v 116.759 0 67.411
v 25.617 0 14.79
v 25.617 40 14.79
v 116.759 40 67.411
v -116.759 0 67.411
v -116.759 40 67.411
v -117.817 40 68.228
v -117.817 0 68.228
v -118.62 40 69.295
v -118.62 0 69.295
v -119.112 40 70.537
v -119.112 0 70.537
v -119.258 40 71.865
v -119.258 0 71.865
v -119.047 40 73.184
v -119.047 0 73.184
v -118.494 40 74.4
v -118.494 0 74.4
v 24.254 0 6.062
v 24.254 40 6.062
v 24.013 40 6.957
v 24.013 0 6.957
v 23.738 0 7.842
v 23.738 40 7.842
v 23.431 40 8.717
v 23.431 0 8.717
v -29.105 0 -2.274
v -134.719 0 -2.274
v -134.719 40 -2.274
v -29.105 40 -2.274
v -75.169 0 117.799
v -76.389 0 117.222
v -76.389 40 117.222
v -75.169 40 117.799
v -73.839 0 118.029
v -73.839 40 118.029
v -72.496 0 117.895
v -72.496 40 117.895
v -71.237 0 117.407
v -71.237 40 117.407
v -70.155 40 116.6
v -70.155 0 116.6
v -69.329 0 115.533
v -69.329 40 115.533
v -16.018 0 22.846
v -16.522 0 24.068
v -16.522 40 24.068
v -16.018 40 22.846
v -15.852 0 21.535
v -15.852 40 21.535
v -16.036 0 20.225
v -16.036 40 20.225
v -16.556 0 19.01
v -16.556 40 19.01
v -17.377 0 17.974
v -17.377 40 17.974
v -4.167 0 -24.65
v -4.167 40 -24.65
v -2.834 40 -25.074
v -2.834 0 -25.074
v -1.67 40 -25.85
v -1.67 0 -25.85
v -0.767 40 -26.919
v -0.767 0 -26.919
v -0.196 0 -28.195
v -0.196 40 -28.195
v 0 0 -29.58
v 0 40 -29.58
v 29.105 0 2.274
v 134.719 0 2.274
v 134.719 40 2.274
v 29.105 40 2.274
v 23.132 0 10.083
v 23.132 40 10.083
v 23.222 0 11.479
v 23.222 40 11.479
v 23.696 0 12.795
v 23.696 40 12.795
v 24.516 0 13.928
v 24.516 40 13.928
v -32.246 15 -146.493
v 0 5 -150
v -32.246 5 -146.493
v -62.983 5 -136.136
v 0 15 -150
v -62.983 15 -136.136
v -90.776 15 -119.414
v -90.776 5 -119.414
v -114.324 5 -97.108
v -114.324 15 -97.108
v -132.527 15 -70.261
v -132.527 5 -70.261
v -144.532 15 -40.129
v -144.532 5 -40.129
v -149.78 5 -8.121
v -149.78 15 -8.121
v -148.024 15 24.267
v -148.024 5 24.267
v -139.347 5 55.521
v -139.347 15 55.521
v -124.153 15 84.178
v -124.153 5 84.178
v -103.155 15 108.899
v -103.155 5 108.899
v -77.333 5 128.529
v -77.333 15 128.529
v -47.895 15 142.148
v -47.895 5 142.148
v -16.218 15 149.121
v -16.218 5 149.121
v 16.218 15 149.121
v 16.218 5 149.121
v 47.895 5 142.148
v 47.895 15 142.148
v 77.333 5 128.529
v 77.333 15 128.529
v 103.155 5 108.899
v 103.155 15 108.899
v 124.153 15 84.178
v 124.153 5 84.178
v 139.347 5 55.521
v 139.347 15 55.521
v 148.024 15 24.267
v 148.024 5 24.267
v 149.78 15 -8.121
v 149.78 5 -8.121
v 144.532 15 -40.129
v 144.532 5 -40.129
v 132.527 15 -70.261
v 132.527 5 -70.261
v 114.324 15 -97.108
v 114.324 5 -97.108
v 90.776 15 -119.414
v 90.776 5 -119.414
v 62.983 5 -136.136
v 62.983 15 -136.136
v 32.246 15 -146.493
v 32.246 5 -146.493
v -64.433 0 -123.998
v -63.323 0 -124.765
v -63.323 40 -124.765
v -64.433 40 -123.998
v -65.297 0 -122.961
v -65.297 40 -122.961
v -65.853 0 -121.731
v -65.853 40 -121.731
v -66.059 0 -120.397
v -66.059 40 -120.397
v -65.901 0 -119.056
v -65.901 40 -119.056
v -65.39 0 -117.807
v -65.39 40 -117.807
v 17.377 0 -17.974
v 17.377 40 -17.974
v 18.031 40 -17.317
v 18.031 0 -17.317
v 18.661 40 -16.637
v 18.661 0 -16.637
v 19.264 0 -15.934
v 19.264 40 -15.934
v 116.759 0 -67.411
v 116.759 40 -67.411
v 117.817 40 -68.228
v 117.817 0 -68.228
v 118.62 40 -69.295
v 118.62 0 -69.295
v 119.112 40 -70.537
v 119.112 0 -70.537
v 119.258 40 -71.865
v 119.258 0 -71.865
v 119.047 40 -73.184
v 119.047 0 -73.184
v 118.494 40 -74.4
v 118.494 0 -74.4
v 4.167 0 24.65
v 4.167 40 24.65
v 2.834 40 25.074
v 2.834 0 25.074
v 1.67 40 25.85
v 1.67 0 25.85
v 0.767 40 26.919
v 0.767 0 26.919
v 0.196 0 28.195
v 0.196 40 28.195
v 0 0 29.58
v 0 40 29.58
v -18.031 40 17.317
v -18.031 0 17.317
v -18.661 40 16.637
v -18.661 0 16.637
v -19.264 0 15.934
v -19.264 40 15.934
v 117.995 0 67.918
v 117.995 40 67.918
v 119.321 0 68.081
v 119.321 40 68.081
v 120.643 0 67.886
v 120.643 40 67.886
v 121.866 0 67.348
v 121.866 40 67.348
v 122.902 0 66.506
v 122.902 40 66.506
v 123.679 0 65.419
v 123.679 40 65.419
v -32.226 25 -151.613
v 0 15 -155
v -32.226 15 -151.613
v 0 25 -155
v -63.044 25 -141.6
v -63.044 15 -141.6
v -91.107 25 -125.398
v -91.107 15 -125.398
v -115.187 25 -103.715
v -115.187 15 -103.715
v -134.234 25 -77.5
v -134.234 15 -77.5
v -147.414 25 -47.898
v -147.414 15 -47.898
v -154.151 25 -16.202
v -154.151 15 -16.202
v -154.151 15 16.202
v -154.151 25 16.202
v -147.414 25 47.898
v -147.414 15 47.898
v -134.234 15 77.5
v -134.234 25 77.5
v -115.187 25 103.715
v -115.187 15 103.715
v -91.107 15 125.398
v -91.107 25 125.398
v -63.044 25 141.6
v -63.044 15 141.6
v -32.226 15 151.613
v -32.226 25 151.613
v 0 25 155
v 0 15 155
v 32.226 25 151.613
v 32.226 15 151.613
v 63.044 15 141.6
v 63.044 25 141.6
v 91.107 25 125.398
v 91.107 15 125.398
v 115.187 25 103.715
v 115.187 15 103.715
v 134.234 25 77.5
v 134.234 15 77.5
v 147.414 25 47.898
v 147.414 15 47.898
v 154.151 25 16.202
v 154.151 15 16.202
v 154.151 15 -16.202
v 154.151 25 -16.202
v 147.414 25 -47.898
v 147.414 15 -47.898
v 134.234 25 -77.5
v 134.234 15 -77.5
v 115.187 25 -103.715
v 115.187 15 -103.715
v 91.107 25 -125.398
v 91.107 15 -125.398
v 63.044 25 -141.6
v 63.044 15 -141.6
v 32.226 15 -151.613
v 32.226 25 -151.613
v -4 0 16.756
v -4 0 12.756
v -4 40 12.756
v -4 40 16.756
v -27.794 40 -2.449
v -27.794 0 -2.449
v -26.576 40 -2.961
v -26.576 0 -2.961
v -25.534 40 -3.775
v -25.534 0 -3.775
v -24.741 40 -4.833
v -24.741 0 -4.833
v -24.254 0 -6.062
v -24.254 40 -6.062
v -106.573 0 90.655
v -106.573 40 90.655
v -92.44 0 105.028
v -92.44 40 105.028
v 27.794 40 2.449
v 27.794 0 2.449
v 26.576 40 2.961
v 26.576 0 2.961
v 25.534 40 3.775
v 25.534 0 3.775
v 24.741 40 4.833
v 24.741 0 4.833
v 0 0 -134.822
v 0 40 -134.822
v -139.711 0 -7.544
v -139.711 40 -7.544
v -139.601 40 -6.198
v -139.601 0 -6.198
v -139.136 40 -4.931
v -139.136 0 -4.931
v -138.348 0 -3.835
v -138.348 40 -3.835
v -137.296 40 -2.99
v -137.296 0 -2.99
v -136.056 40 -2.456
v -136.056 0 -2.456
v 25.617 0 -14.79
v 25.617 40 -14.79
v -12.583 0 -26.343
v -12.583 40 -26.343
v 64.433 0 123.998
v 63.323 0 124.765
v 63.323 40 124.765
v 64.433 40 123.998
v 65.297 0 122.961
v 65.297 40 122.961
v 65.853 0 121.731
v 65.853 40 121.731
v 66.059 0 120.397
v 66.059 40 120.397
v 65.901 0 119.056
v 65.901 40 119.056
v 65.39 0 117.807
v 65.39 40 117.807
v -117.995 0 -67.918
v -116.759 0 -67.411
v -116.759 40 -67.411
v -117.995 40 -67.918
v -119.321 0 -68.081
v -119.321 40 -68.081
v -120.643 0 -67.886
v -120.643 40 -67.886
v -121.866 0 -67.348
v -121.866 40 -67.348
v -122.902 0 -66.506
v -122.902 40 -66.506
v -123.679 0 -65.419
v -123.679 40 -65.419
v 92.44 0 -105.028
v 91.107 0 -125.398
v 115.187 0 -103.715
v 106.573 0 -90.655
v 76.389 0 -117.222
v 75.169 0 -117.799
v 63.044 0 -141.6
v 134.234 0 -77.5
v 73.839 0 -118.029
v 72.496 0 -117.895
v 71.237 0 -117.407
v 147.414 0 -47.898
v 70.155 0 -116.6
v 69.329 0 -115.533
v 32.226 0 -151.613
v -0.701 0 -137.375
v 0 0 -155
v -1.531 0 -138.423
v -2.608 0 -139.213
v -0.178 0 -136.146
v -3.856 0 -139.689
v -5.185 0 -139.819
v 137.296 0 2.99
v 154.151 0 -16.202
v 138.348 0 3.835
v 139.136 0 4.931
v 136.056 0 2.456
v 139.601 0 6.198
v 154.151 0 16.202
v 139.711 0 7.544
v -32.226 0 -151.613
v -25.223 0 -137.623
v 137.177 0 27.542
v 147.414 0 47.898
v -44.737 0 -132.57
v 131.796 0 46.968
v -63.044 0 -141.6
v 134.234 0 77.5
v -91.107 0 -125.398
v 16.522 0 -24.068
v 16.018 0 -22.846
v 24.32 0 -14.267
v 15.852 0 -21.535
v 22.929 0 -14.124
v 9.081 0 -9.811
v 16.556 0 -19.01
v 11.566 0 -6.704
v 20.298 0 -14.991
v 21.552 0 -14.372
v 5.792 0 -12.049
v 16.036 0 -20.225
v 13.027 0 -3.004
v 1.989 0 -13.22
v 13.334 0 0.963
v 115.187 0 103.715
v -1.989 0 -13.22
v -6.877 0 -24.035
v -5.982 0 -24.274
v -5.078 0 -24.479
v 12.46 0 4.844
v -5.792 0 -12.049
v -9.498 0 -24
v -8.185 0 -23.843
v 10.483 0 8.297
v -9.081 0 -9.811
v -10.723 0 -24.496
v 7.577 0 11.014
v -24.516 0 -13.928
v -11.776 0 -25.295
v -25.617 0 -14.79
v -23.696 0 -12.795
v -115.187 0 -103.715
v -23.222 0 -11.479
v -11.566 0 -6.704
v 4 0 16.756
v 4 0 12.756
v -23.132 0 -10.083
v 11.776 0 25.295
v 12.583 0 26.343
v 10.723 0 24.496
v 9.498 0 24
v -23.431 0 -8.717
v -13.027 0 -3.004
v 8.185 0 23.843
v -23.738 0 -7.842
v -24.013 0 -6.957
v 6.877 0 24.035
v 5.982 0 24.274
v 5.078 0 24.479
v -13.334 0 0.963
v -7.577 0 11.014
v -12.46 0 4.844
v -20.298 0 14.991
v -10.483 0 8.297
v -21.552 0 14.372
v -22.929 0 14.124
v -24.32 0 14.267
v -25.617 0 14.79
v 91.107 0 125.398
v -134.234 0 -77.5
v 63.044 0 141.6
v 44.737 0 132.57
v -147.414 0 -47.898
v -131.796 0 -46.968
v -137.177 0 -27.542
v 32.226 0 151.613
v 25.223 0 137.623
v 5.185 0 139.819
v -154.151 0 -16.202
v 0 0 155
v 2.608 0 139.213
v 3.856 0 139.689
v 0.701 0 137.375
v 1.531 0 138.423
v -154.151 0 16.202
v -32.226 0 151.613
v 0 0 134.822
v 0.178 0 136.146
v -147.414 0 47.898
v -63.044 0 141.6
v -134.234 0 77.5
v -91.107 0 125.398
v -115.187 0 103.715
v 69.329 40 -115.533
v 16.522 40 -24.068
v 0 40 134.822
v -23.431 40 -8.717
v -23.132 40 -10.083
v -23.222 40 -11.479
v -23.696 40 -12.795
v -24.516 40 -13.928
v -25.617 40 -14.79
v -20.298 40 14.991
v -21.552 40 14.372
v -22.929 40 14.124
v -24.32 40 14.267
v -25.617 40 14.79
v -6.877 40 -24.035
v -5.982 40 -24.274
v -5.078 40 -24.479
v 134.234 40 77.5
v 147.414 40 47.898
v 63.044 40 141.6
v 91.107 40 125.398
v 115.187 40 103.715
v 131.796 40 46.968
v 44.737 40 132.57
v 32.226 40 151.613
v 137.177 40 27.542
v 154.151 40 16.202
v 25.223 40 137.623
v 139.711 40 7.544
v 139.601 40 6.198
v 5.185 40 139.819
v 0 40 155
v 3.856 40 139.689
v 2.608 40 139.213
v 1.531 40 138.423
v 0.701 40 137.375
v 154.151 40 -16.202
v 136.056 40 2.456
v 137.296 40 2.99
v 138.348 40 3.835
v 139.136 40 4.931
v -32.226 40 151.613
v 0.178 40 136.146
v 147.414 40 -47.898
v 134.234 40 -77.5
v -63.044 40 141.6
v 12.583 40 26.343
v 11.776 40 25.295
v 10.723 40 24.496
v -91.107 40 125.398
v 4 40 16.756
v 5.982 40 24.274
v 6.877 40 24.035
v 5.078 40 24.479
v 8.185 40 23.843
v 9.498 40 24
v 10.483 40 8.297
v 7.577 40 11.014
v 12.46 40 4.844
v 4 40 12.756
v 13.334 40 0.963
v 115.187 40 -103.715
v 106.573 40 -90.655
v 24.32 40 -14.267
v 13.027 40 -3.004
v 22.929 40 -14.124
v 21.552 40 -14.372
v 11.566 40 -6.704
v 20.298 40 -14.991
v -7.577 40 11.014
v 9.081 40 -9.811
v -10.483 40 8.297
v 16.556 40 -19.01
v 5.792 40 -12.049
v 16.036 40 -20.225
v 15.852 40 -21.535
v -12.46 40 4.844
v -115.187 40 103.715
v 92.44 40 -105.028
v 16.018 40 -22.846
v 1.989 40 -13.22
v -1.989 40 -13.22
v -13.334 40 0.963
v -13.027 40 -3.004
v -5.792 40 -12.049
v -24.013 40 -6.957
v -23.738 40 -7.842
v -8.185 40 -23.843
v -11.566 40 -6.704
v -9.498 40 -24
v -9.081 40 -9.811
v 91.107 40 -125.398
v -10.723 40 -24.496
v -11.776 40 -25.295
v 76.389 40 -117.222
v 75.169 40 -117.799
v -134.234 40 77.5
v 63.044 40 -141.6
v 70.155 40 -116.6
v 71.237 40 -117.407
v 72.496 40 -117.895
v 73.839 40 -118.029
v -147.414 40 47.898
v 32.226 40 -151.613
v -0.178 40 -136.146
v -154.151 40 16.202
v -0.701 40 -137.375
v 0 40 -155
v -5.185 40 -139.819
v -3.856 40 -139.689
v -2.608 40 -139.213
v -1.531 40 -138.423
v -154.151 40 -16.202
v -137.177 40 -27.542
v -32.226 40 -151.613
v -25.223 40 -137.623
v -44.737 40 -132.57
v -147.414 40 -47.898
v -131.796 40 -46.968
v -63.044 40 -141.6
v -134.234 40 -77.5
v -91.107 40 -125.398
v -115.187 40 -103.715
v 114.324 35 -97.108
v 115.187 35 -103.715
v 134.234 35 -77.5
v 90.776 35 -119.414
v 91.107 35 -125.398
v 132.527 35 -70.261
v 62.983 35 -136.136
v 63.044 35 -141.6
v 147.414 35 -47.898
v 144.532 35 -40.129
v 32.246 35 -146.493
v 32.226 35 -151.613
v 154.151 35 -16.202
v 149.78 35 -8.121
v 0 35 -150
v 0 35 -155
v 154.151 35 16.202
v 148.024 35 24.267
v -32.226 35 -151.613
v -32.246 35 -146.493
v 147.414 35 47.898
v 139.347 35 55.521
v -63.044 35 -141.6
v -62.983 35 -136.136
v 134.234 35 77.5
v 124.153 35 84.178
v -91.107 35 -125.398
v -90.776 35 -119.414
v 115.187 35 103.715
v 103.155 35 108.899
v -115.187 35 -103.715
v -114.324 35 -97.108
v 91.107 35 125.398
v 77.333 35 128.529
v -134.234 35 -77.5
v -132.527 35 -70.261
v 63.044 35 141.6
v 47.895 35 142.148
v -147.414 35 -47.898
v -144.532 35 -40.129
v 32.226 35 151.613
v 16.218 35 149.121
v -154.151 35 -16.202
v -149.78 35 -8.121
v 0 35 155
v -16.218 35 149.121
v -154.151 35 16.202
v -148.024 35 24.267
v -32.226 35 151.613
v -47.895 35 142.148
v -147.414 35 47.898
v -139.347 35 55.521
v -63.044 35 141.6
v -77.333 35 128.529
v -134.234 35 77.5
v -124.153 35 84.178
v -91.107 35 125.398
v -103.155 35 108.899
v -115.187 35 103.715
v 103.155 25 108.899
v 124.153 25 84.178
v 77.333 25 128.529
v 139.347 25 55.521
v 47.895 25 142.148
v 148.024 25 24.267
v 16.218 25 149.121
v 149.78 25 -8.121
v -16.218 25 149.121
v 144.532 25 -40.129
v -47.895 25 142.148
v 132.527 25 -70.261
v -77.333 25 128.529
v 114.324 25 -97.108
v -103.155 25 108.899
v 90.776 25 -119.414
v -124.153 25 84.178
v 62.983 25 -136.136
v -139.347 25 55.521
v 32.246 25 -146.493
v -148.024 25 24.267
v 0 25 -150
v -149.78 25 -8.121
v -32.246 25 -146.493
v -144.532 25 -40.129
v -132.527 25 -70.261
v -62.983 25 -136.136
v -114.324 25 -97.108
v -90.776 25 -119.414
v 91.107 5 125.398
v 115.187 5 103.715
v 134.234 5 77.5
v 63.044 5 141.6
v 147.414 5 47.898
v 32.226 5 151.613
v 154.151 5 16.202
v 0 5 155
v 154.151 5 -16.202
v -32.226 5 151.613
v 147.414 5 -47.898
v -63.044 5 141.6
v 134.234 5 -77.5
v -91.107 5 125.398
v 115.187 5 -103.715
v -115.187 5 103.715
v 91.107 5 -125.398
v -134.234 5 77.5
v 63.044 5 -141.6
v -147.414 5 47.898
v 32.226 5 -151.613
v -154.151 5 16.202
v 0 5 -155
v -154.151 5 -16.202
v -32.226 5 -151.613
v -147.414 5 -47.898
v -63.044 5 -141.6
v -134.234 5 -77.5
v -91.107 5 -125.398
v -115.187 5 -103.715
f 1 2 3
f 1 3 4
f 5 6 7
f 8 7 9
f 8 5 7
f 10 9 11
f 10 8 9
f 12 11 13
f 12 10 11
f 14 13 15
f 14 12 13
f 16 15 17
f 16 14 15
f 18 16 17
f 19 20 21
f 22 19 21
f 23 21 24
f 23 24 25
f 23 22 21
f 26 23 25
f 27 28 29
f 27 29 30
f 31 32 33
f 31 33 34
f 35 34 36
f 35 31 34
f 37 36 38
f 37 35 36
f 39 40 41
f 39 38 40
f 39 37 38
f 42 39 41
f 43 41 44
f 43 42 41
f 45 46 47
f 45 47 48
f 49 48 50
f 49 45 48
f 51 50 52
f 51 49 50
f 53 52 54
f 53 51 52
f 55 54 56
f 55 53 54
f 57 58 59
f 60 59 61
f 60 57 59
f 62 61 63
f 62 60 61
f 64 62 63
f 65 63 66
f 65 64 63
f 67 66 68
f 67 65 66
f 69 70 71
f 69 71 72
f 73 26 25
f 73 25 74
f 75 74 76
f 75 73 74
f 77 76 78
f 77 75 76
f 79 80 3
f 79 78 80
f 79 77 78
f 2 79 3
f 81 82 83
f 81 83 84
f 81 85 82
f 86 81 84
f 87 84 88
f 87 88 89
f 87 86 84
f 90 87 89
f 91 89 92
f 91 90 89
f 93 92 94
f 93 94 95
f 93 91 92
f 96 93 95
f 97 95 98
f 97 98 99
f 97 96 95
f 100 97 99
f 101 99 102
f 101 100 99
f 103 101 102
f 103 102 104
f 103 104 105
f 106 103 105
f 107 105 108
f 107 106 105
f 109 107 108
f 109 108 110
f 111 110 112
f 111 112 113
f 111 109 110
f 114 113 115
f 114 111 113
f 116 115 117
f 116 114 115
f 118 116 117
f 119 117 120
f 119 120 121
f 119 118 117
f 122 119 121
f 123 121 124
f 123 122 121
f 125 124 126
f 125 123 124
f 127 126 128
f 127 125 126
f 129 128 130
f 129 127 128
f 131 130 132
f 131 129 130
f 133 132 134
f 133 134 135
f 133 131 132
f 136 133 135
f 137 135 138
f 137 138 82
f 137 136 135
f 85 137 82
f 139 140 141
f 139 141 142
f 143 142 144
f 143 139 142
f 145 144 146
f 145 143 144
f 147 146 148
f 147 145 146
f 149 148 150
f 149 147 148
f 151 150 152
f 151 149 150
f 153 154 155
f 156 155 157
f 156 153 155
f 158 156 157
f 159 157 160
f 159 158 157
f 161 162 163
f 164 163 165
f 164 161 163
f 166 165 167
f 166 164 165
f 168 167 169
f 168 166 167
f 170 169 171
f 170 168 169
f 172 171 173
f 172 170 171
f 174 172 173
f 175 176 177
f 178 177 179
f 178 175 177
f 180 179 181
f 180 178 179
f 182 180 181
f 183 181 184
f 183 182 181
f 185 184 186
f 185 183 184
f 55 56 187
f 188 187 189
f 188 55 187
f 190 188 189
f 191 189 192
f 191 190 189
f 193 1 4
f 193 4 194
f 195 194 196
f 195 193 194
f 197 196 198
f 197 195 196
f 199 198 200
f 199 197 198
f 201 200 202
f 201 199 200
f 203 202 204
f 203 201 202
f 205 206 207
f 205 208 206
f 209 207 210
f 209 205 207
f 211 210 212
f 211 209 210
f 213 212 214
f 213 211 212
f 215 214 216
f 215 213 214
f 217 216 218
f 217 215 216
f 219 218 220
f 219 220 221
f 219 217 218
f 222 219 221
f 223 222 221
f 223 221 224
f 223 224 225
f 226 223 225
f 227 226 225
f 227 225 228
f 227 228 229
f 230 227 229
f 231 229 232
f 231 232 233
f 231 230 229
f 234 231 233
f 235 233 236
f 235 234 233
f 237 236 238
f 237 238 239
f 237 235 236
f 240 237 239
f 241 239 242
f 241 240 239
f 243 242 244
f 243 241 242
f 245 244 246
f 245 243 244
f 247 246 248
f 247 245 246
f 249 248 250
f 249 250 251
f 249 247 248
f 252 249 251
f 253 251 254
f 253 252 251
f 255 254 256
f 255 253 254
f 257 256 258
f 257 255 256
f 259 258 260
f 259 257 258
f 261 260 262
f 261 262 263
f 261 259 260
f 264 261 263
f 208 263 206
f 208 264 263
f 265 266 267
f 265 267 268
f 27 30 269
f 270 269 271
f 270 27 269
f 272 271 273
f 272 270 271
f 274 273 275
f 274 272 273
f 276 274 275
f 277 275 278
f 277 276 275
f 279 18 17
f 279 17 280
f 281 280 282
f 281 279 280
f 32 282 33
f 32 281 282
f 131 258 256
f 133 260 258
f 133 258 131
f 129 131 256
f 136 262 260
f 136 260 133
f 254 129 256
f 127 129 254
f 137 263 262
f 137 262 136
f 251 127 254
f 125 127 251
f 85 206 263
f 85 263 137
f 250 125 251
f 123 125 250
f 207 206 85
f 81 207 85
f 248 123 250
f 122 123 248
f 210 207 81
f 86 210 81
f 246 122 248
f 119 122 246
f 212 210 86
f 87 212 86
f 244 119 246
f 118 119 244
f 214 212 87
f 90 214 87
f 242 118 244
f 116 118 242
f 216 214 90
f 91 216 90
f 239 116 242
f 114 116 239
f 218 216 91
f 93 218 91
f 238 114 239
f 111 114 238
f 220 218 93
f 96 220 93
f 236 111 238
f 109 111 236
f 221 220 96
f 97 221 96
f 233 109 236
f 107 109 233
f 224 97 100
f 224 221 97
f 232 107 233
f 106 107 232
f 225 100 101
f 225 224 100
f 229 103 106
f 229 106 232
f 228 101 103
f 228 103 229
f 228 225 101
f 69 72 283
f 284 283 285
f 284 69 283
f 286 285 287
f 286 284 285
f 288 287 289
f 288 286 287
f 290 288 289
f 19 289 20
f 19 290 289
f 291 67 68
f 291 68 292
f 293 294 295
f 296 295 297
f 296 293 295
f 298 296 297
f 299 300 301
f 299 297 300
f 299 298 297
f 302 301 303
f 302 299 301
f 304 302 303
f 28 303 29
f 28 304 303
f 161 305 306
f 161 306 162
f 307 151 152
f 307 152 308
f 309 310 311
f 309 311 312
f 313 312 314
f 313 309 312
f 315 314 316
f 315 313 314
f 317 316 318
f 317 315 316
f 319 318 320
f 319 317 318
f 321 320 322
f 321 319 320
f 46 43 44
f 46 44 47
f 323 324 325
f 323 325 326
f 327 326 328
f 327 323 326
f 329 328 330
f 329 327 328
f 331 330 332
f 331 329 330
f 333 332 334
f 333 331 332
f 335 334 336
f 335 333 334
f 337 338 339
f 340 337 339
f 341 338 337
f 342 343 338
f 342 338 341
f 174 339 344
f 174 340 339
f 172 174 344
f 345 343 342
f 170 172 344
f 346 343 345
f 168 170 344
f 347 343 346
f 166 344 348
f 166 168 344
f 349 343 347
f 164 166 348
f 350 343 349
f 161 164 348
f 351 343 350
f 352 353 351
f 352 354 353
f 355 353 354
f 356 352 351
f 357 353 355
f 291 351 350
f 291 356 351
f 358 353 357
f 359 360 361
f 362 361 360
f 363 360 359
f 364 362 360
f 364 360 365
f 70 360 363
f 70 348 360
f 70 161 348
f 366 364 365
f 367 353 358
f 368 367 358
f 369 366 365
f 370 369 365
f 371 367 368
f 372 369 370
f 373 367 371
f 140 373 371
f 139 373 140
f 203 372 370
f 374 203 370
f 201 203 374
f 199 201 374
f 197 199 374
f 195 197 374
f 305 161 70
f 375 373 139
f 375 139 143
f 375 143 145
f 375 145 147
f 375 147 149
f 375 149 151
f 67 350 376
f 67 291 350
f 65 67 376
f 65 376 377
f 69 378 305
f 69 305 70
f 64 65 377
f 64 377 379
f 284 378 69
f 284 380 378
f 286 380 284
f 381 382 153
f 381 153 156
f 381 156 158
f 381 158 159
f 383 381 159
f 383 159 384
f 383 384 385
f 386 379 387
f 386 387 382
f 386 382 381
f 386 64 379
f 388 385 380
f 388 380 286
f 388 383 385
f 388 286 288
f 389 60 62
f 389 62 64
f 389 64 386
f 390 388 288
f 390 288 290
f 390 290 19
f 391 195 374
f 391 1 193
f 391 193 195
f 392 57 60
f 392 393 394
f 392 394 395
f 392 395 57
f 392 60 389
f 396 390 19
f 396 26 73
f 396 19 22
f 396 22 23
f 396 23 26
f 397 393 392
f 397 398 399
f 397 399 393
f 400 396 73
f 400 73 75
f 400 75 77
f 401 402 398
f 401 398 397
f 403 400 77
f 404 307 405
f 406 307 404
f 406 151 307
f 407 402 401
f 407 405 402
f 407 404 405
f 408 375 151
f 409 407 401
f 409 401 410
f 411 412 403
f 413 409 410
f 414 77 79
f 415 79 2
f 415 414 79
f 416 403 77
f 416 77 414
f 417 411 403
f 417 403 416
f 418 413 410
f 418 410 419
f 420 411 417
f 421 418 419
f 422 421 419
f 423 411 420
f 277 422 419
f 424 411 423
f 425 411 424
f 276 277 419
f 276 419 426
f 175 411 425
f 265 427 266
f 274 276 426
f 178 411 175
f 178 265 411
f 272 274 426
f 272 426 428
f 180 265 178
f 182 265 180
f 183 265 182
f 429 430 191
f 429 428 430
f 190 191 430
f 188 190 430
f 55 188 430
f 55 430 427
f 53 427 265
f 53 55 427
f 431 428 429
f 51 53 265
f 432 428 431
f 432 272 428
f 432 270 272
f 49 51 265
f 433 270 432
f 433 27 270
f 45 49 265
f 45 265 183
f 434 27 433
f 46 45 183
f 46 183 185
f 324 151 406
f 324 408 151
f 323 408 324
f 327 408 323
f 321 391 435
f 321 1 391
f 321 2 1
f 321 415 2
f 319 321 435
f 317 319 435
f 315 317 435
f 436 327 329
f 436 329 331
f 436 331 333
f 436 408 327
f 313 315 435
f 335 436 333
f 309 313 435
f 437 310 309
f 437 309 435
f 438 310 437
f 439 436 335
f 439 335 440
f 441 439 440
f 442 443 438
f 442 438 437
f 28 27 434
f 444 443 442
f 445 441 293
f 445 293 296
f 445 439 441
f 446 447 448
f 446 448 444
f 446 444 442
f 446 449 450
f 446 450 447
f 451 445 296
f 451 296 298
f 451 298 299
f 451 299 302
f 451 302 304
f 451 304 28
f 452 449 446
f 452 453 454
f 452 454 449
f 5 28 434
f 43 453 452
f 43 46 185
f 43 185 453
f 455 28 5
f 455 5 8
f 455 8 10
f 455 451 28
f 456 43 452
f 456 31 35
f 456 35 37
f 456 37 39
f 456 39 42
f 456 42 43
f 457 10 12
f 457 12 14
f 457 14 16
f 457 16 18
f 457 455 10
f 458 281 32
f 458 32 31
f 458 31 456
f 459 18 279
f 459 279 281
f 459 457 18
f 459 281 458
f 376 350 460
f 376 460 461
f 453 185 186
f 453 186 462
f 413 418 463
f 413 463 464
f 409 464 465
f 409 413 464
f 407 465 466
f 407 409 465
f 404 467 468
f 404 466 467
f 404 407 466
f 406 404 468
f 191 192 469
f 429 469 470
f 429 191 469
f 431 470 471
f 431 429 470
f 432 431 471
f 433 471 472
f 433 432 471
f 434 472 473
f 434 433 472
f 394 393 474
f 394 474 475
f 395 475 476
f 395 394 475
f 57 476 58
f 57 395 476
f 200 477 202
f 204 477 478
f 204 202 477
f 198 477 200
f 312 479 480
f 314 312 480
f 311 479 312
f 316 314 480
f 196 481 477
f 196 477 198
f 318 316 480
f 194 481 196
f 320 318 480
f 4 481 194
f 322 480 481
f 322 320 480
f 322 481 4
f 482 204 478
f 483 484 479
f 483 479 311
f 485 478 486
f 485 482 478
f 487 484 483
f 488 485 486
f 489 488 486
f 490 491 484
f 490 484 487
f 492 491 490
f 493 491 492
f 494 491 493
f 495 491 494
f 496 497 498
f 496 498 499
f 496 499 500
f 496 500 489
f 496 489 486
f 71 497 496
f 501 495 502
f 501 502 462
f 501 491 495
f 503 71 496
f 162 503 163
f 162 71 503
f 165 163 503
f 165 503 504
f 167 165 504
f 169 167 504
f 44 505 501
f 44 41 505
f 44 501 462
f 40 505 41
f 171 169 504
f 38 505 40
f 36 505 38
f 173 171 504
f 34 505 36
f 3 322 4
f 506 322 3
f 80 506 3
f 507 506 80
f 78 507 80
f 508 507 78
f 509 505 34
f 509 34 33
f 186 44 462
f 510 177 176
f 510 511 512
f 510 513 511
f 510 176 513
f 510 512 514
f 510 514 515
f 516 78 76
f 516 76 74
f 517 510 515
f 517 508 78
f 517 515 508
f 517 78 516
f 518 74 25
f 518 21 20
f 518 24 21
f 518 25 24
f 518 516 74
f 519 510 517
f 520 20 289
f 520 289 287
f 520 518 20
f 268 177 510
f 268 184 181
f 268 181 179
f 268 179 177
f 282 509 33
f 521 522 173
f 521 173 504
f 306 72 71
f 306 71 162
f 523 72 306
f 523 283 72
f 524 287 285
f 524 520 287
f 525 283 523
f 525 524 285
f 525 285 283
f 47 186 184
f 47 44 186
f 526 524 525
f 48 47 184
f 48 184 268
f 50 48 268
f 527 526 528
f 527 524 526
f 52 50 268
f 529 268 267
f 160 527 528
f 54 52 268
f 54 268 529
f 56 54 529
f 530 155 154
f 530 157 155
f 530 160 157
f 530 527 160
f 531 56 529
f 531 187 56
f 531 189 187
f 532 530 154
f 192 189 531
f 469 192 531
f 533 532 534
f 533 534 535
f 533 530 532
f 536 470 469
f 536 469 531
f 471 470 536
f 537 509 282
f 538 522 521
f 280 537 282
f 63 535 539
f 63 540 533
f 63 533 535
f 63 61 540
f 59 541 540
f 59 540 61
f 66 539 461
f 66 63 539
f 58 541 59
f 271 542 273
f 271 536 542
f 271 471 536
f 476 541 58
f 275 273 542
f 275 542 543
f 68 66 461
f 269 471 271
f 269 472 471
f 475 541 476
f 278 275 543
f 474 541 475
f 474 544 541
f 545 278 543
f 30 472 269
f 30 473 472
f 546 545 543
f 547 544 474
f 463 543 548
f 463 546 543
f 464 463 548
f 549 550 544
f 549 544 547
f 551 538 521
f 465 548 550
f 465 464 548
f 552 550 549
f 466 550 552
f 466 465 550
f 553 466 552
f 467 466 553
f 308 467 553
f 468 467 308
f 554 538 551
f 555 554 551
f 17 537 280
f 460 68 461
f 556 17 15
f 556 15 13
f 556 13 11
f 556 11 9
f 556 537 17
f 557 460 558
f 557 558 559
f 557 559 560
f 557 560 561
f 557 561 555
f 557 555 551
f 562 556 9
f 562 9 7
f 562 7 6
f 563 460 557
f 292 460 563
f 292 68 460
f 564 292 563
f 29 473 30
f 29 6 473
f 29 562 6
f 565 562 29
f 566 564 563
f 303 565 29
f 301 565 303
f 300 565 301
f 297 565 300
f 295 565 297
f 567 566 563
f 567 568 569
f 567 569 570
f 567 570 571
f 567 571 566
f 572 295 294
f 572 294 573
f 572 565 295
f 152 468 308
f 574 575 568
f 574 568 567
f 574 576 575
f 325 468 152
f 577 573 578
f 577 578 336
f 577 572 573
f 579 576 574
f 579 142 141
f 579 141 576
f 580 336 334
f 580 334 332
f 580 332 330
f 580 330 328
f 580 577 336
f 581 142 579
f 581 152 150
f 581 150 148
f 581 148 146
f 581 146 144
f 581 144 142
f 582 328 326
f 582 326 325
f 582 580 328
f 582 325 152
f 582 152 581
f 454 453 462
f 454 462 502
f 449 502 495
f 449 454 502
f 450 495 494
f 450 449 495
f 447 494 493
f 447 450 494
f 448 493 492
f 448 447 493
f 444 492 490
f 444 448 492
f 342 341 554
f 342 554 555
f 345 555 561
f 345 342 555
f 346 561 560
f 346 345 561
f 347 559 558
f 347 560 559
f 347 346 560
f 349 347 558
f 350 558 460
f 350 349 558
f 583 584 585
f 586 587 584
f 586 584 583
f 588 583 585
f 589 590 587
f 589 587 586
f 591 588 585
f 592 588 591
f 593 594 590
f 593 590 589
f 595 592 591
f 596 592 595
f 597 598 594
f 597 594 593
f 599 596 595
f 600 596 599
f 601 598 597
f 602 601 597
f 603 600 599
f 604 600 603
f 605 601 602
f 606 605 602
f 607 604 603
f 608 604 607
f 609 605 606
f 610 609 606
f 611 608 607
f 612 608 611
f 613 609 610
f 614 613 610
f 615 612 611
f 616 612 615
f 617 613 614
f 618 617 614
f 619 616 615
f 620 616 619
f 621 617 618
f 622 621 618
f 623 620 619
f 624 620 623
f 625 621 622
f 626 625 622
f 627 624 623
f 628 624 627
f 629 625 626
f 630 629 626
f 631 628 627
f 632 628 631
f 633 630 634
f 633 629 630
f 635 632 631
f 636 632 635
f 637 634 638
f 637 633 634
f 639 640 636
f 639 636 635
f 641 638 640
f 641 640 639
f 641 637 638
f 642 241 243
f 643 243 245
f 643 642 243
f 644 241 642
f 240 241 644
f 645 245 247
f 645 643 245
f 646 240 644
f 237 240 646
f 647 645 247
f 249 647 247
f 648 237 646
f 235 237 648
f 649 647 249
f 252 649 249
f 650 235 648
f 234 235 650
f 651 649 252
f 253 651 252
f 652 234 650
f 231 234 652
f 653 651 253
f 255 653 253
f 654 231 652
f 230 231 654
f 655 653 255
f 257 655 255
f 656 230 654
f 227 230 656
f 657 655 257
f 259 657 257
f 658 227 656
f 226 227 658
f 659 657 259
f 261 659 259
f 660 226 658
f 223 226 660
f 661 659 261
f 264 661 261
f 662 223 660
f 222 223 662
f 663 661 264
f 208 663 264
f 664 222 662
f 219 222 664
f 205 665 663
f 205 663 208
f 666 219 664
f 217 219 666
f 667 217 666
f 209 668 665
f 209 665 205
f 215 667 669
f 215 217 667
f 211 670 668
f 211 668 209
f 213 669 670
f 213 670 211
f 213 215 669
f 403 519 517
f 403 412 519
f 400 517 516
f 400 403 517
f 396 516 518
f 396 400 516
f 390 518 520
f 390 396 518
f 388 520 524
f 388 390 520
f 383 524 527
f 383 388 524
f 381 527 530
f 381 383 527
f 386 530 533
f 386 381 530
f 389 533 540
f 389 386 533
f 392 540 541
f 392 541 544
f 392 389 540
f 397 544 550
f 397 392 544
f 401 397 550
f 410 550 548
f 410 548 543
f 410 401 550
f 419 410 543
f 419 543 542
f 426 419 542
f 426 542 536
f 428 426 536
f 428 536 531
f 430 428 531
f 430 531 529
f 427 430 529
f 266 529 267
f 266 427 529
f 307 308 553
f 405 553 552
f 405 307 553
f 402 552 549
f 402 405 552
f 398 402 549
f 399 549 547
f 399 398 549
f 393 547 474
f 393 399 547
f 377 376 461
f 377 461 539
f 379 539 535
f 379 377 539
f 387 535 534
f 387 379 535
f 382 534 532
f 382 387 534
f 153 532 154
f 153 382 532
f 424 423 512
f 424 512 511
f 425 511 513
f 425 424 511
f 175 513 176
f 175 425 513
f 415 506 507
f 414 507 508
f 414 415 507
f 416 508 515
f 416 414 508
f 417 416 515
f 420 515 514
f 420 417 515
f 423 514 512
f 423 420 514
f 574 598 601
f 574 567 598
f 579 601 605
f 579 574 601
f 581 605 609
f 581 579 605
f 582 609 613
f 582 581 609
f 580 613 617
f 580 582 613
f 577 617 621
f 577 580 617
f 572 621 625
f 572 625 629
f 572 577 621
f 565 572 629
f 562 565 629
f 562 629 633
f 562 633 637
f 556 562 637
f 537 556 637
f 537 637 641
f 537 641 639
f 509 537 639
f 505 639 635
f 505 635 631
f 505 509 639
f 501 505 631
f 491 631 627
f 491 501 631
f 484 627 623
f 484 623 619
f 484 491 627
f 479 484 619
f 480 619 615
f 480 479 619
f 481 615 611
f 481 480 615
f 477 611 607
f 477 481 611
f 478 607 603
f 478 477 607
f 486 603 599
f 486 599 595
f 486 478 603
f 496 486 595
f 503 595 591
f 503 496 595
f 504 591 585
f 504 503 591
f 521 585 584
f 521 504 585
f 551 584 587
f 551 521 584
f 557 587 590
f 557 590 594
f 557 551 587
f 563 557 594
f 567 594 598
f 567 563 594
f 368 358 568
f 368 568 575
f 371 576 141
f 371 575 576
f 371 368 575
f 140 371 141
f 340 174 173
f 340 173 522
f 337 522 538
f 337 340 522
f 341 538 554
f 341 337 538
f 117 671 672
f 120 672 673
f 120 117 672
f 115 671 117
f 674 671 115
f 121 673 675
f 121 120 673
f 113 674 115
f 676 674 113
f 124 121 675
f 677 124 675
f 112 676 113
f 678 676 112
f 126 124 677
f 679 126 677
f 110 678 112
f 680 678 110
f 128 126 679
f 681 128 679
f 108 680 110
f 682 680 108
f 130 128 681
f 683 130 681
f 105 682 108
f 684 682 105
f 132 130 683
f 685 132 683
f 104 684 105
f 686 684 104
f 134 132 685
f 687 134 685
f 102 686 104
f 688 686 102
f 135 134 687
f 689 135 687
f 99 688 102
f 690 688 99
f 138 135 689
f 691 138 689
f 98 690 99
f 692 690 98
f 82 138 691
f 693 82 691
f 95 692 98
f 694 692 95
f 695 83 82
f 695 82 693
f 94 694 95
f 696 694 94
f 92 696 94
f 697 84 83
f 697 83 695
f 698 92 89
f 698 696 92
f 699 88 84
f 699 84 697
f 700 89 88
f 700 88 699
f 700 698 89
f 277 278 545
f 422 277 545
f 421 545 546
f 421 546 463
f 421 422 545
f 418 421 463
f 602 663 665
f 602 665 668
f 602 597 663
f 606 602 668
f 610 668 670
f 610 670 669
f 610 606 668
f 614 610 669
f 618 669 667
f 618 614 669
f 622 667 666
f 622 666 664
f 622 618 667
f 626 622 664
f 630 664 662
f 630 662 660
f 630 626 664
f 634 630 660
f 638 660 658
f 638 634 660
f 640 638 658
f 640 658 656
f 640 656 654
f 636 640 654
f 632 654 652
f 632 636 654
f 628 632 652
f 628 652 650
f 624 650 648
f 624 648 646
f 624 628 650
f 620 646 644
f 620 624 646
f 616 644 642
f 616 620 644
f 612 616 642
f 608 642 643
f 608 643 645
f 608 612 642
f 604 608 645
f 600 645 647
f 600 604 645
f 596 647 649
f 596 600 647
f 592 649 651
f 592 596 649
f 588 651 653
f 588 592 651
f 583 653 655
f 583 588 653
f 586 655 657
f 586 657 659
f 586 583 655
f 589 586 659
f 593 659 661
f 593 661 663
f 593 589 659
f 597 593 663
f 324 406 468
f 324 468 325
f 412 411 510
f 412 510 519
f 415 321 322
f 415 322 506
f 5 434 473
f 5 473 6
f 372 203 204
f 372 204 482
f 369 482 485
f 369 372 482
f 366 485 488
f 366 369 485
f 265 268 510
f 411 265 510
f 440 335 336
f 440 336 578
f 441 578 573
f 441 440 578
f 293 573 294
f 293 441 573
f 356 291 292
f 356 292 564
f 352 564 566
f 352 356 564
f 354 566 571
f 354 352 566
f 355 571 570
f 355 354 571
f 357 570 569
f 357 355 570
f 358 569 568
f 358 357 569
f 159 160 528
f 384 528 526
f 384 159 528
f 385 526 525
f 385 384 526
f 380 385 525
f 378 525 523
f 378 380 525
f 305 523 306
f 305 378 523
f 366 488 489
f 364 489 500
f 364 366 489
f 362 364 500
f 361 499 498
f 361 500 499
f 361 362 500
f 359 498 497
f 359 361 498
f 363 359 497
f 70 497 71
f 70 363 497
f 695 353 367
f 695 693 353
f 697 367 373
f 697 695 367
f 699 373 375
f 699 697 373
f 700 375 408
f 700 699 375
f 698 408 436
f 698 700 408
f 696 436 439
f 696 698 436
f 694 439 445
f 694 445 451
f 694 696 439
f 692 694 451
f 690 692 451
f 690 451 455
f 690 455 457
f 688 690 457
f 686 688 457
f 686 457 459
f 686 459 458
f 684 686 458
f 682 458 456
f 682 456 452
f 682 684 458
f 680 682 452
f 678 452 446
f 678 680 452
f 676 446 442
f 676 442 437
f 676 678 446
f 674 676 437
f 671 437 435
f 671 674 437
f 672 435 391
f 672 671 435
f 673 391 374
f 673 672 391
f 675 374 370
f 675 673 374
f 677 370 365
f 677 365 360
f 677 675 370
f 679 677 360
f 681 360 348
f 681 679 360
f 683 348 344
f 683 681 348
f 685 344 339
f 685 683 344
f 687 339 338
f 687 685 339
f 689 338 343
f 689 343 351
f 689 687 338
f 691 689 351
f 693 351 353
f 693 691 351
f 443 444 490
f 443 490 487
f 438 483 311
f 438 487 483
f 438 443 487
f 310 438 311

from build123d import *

# Parameters (mm, degrees)
CUT_EXTRUDE1_DEPTH = 223.822799552
CUT_EXTRUDE2_DEPTH = 223.822799552


with BuildPart() as part:
    # Sketch1 → Revolve1 (revolve)
    with BuildSketch(Plane(origin=(0, 0, 0), x_dir=(0, 0, -1), z_dir=(1, 0, 0))):
        Polygon((13.36858006, 0), (155, 0), (155, 5), (150, 5), (150, 15), (155, 15), (155, 25), (150, 25), (150, 35), (155, 35), (155, 40), (13.36858006, 40), align=None)
    revolve(axis=Axis((0, 0, 0), (0, 1, 0)))

    # Sketch2 → Cut-Extrude1 (cut, through all)
    with BuildSketch(Plane.XZ):
        with BuildLine():
            Line((-4, 16.756133146), (4, 16.756133146))
            Line((4, 16.756133146), (4, 12.756133146))
            ThreePointArc((4, 12.756133146), (0, 13.36858006), (-4, 12.756133146))
            Line((-4, 12.756133146), (-4, 16.756133146))
        make_face()
    extrude(amount=-CUT_EXTRUDE1_DEPTH, mode=Mode.SUBTRACT)

    # Sketch3 → Cut-Extrude2 (cut, through all)
    with BuildSketch(Plane.XZ):
        with BuildLine():
            Line((0, 29.580398915), (0, 134.82214713))
            ThreePointArc((0, 134.82214713), (1.530598787, 138.422599216), (5.18530209, 139.818712264))
            ThreePointArc((5.18530209, 139.818712264), (35.071098816, 135.448062683), (63.322556568, 124.765433861))
            ThreePointArc((63.322556568, 124.765433861), (65.852633094, 121.73068432), (65.389787061, 117.806813075))
            Line((65.389787061, 117.806813075), (12.582866204, 26.34254316))
            ThreePointArc((12.582866204, 26.34254316), (10.127088699, 24.207156024), (6.877282654, 24.035452633))
            ThreePointArc((6.877282654, 24.035452633), (5.530526507, 24.380592211), (4.166666667, 24.65033243))
            ThreePointArc((4.166666667, 24.65033243), (1.181186921, 26.352912794), (0, 29.580398915))
        make_face()
        with BuildLine():
            Line((25.617376915, 14.790199458), (116.759404407, 67.411073565))
            ThreePointArc((116.759404407, 67.411073565), (120.642786773, 67.885762175), (123.67920779, 65.418752795))
            ThreePointArc((123.67920779, 65.418752795), (134.837012585, 37.351568828), (139.711313522, 7.543774309))
            ThreePointArc((139.711313522, 7.543774309), (138.348181588, 3.835288995), (134.718586392, 2.274189795))
            Line((134.718586392, 2.274189795), (29.104744679, 2.274189795))
            ThreePointArc((29.104744679, 2.274189795), (26.027556419, 3.333261933), (24.253953899, 6.061824829))
            ThreePointArc((24.253953899, 6.061824829), (23.879475467, 7.400719654), (23.431147429, 8.716727032))
            ThreePointArc((23.431147429, 8.716727032), (23.412885403, 12.153518517), (25.617376915, 14.790199458))
        make_face()
        with BuildLine():
            Line((25.617376915, -14.790199458), (116.759404407, -67.411073565))
            ThreePointArc((116.759404407, -67.411073565), (119.112187985, -70.536837041), (118.4939057, -74.399959468))
            ThreePointArc((118.4939057, -74.399959468), (99.765913769, -98.096493855), (76.388756953, -117.221659551))
            ThreePointArc((76.388756953, -117.221659551), (72.495548494, -117.895395325), (69.328799331, -115.53262328))
            Line((69.328799331, -115.53262328), (16.521878475, -24.068353365))
            ThreePointArc((16.521878475, -24.068353365), (15.900467721, -20.873894091), (17.376671245, -17.973627804))
            ThreePointArc((17.376671245, -17.973627804), (18.348948961, -16.979872557), (19.264480762, -15.933605397))
            ThreePointArc((19.264480762, -15.933605397), (22.231698483, -14.199394277), (25.617376915, -14.790199458))
        make_face()
        with BuildLine():
            Line((0, -29.580398915), (0, -134.82214713))
            ThreePointArc((0, -134.82214713), (-1.530598787, -138.422599216), (-5.18530209, -139.818712264))
            ThreePointArc((-5.18530209, -139.818712264), (-35.071098816, -135.448062683), (-63.322556568, -124.765433861))
            ThreePointArc((-63.322556568, -124.765433861), (-65.852633094, -121.73068432), (-65.389787061, -117.806813075))
            Line((-65.389787061, -117.806813075), (-12.582866204, -26.34254316))
            ThreePointArc((-12.582866204, -26.34254316), (-10.127088699, -24.207156024), (-6.877282654, -24.035452633))
            ThreePointArc((-6.877282654, -24.035452633), (-5.530526507, -24.380592211), (-4.166666667, -24.65033243))
            ThreePointArc((-4.166666667, -24.65033243), (-1.181186921, -26.352912794), (0, -29.580398915))
        make_face()
        with BuildLine():
            Line((-25.617376915, -14.790199458), (-116.759404407, -67.411073565))
            ThreePointArc((-116.759404407, -67.411073565), (-120.642786773, -67.885762175), (-123.67920779, -65.418752795))
            ThreePointArc((-123.67920779, -65.418752795), (-134.837012585, -37.351568828), (-139.711313522, -7.543774309))
            ThreePointArc((-139.711313522, -7.543774309), (-138.348181588, -3.835288995), (-134.718586392, -2.274189795))
            Line((-134.718586392, -2.274189795), (-29.104744679, -2.274189795))
            ThreePointArc((-29.104744679, -2.274189795), (-26.027556419, -3.333261933), (-24.253953899, -6.061824829))
            ThreePointArc((-24.253953899, -6.061824829), (-23.879475467, -7.400719654), (-23.431147429, -8.716727032))
            ThreePointArc((-23.431147429, -8.716727032), (-23.412885403, -12.153518517), (-25.617376915, -14.790199458))
        make_face()
        with BuildLine():
            Line((-25.617376915, 14.790199458), (-116.759404407, 67.411073565))
            ThreePointArc((-116.759404407, 67.411073565), (-119.112187985, 70.536837041), (-118.4939057, 74.399959468))
            ThreePointArc((-118.4939057, 74.399959468), (-99.765913769, 98.096493855), (-76.388756953, 117.221659551))
            ThreePointArc((-76.388756953, 117.221659551), (-72.495548494, 117.895395325), (-69.328799331, 115.53262328))
            Line((-69.328799331, 115.53262328), (-16.521878475, 24.068353365))
            ThreePointArc((-16.521878475, 24.068353365), (-15.900467721, 20.873894091), (-17.376671245, 17.973627804))
            ThreePointArc((-17.376671245, 17.973627804), (-18.348948961, 16.979872557), (-19.264480762, 15.933605397))
            ThreePointArc((-19.264480762, 15.933605397), (-22.231698483, 14.199394277), (-25.617376915, 14.790199458))
        make_face()
    extrude(amount=-CUT_EXTRUDE2_DEPTH, mode=Mode.SUBTRACT)


solid = part.part
